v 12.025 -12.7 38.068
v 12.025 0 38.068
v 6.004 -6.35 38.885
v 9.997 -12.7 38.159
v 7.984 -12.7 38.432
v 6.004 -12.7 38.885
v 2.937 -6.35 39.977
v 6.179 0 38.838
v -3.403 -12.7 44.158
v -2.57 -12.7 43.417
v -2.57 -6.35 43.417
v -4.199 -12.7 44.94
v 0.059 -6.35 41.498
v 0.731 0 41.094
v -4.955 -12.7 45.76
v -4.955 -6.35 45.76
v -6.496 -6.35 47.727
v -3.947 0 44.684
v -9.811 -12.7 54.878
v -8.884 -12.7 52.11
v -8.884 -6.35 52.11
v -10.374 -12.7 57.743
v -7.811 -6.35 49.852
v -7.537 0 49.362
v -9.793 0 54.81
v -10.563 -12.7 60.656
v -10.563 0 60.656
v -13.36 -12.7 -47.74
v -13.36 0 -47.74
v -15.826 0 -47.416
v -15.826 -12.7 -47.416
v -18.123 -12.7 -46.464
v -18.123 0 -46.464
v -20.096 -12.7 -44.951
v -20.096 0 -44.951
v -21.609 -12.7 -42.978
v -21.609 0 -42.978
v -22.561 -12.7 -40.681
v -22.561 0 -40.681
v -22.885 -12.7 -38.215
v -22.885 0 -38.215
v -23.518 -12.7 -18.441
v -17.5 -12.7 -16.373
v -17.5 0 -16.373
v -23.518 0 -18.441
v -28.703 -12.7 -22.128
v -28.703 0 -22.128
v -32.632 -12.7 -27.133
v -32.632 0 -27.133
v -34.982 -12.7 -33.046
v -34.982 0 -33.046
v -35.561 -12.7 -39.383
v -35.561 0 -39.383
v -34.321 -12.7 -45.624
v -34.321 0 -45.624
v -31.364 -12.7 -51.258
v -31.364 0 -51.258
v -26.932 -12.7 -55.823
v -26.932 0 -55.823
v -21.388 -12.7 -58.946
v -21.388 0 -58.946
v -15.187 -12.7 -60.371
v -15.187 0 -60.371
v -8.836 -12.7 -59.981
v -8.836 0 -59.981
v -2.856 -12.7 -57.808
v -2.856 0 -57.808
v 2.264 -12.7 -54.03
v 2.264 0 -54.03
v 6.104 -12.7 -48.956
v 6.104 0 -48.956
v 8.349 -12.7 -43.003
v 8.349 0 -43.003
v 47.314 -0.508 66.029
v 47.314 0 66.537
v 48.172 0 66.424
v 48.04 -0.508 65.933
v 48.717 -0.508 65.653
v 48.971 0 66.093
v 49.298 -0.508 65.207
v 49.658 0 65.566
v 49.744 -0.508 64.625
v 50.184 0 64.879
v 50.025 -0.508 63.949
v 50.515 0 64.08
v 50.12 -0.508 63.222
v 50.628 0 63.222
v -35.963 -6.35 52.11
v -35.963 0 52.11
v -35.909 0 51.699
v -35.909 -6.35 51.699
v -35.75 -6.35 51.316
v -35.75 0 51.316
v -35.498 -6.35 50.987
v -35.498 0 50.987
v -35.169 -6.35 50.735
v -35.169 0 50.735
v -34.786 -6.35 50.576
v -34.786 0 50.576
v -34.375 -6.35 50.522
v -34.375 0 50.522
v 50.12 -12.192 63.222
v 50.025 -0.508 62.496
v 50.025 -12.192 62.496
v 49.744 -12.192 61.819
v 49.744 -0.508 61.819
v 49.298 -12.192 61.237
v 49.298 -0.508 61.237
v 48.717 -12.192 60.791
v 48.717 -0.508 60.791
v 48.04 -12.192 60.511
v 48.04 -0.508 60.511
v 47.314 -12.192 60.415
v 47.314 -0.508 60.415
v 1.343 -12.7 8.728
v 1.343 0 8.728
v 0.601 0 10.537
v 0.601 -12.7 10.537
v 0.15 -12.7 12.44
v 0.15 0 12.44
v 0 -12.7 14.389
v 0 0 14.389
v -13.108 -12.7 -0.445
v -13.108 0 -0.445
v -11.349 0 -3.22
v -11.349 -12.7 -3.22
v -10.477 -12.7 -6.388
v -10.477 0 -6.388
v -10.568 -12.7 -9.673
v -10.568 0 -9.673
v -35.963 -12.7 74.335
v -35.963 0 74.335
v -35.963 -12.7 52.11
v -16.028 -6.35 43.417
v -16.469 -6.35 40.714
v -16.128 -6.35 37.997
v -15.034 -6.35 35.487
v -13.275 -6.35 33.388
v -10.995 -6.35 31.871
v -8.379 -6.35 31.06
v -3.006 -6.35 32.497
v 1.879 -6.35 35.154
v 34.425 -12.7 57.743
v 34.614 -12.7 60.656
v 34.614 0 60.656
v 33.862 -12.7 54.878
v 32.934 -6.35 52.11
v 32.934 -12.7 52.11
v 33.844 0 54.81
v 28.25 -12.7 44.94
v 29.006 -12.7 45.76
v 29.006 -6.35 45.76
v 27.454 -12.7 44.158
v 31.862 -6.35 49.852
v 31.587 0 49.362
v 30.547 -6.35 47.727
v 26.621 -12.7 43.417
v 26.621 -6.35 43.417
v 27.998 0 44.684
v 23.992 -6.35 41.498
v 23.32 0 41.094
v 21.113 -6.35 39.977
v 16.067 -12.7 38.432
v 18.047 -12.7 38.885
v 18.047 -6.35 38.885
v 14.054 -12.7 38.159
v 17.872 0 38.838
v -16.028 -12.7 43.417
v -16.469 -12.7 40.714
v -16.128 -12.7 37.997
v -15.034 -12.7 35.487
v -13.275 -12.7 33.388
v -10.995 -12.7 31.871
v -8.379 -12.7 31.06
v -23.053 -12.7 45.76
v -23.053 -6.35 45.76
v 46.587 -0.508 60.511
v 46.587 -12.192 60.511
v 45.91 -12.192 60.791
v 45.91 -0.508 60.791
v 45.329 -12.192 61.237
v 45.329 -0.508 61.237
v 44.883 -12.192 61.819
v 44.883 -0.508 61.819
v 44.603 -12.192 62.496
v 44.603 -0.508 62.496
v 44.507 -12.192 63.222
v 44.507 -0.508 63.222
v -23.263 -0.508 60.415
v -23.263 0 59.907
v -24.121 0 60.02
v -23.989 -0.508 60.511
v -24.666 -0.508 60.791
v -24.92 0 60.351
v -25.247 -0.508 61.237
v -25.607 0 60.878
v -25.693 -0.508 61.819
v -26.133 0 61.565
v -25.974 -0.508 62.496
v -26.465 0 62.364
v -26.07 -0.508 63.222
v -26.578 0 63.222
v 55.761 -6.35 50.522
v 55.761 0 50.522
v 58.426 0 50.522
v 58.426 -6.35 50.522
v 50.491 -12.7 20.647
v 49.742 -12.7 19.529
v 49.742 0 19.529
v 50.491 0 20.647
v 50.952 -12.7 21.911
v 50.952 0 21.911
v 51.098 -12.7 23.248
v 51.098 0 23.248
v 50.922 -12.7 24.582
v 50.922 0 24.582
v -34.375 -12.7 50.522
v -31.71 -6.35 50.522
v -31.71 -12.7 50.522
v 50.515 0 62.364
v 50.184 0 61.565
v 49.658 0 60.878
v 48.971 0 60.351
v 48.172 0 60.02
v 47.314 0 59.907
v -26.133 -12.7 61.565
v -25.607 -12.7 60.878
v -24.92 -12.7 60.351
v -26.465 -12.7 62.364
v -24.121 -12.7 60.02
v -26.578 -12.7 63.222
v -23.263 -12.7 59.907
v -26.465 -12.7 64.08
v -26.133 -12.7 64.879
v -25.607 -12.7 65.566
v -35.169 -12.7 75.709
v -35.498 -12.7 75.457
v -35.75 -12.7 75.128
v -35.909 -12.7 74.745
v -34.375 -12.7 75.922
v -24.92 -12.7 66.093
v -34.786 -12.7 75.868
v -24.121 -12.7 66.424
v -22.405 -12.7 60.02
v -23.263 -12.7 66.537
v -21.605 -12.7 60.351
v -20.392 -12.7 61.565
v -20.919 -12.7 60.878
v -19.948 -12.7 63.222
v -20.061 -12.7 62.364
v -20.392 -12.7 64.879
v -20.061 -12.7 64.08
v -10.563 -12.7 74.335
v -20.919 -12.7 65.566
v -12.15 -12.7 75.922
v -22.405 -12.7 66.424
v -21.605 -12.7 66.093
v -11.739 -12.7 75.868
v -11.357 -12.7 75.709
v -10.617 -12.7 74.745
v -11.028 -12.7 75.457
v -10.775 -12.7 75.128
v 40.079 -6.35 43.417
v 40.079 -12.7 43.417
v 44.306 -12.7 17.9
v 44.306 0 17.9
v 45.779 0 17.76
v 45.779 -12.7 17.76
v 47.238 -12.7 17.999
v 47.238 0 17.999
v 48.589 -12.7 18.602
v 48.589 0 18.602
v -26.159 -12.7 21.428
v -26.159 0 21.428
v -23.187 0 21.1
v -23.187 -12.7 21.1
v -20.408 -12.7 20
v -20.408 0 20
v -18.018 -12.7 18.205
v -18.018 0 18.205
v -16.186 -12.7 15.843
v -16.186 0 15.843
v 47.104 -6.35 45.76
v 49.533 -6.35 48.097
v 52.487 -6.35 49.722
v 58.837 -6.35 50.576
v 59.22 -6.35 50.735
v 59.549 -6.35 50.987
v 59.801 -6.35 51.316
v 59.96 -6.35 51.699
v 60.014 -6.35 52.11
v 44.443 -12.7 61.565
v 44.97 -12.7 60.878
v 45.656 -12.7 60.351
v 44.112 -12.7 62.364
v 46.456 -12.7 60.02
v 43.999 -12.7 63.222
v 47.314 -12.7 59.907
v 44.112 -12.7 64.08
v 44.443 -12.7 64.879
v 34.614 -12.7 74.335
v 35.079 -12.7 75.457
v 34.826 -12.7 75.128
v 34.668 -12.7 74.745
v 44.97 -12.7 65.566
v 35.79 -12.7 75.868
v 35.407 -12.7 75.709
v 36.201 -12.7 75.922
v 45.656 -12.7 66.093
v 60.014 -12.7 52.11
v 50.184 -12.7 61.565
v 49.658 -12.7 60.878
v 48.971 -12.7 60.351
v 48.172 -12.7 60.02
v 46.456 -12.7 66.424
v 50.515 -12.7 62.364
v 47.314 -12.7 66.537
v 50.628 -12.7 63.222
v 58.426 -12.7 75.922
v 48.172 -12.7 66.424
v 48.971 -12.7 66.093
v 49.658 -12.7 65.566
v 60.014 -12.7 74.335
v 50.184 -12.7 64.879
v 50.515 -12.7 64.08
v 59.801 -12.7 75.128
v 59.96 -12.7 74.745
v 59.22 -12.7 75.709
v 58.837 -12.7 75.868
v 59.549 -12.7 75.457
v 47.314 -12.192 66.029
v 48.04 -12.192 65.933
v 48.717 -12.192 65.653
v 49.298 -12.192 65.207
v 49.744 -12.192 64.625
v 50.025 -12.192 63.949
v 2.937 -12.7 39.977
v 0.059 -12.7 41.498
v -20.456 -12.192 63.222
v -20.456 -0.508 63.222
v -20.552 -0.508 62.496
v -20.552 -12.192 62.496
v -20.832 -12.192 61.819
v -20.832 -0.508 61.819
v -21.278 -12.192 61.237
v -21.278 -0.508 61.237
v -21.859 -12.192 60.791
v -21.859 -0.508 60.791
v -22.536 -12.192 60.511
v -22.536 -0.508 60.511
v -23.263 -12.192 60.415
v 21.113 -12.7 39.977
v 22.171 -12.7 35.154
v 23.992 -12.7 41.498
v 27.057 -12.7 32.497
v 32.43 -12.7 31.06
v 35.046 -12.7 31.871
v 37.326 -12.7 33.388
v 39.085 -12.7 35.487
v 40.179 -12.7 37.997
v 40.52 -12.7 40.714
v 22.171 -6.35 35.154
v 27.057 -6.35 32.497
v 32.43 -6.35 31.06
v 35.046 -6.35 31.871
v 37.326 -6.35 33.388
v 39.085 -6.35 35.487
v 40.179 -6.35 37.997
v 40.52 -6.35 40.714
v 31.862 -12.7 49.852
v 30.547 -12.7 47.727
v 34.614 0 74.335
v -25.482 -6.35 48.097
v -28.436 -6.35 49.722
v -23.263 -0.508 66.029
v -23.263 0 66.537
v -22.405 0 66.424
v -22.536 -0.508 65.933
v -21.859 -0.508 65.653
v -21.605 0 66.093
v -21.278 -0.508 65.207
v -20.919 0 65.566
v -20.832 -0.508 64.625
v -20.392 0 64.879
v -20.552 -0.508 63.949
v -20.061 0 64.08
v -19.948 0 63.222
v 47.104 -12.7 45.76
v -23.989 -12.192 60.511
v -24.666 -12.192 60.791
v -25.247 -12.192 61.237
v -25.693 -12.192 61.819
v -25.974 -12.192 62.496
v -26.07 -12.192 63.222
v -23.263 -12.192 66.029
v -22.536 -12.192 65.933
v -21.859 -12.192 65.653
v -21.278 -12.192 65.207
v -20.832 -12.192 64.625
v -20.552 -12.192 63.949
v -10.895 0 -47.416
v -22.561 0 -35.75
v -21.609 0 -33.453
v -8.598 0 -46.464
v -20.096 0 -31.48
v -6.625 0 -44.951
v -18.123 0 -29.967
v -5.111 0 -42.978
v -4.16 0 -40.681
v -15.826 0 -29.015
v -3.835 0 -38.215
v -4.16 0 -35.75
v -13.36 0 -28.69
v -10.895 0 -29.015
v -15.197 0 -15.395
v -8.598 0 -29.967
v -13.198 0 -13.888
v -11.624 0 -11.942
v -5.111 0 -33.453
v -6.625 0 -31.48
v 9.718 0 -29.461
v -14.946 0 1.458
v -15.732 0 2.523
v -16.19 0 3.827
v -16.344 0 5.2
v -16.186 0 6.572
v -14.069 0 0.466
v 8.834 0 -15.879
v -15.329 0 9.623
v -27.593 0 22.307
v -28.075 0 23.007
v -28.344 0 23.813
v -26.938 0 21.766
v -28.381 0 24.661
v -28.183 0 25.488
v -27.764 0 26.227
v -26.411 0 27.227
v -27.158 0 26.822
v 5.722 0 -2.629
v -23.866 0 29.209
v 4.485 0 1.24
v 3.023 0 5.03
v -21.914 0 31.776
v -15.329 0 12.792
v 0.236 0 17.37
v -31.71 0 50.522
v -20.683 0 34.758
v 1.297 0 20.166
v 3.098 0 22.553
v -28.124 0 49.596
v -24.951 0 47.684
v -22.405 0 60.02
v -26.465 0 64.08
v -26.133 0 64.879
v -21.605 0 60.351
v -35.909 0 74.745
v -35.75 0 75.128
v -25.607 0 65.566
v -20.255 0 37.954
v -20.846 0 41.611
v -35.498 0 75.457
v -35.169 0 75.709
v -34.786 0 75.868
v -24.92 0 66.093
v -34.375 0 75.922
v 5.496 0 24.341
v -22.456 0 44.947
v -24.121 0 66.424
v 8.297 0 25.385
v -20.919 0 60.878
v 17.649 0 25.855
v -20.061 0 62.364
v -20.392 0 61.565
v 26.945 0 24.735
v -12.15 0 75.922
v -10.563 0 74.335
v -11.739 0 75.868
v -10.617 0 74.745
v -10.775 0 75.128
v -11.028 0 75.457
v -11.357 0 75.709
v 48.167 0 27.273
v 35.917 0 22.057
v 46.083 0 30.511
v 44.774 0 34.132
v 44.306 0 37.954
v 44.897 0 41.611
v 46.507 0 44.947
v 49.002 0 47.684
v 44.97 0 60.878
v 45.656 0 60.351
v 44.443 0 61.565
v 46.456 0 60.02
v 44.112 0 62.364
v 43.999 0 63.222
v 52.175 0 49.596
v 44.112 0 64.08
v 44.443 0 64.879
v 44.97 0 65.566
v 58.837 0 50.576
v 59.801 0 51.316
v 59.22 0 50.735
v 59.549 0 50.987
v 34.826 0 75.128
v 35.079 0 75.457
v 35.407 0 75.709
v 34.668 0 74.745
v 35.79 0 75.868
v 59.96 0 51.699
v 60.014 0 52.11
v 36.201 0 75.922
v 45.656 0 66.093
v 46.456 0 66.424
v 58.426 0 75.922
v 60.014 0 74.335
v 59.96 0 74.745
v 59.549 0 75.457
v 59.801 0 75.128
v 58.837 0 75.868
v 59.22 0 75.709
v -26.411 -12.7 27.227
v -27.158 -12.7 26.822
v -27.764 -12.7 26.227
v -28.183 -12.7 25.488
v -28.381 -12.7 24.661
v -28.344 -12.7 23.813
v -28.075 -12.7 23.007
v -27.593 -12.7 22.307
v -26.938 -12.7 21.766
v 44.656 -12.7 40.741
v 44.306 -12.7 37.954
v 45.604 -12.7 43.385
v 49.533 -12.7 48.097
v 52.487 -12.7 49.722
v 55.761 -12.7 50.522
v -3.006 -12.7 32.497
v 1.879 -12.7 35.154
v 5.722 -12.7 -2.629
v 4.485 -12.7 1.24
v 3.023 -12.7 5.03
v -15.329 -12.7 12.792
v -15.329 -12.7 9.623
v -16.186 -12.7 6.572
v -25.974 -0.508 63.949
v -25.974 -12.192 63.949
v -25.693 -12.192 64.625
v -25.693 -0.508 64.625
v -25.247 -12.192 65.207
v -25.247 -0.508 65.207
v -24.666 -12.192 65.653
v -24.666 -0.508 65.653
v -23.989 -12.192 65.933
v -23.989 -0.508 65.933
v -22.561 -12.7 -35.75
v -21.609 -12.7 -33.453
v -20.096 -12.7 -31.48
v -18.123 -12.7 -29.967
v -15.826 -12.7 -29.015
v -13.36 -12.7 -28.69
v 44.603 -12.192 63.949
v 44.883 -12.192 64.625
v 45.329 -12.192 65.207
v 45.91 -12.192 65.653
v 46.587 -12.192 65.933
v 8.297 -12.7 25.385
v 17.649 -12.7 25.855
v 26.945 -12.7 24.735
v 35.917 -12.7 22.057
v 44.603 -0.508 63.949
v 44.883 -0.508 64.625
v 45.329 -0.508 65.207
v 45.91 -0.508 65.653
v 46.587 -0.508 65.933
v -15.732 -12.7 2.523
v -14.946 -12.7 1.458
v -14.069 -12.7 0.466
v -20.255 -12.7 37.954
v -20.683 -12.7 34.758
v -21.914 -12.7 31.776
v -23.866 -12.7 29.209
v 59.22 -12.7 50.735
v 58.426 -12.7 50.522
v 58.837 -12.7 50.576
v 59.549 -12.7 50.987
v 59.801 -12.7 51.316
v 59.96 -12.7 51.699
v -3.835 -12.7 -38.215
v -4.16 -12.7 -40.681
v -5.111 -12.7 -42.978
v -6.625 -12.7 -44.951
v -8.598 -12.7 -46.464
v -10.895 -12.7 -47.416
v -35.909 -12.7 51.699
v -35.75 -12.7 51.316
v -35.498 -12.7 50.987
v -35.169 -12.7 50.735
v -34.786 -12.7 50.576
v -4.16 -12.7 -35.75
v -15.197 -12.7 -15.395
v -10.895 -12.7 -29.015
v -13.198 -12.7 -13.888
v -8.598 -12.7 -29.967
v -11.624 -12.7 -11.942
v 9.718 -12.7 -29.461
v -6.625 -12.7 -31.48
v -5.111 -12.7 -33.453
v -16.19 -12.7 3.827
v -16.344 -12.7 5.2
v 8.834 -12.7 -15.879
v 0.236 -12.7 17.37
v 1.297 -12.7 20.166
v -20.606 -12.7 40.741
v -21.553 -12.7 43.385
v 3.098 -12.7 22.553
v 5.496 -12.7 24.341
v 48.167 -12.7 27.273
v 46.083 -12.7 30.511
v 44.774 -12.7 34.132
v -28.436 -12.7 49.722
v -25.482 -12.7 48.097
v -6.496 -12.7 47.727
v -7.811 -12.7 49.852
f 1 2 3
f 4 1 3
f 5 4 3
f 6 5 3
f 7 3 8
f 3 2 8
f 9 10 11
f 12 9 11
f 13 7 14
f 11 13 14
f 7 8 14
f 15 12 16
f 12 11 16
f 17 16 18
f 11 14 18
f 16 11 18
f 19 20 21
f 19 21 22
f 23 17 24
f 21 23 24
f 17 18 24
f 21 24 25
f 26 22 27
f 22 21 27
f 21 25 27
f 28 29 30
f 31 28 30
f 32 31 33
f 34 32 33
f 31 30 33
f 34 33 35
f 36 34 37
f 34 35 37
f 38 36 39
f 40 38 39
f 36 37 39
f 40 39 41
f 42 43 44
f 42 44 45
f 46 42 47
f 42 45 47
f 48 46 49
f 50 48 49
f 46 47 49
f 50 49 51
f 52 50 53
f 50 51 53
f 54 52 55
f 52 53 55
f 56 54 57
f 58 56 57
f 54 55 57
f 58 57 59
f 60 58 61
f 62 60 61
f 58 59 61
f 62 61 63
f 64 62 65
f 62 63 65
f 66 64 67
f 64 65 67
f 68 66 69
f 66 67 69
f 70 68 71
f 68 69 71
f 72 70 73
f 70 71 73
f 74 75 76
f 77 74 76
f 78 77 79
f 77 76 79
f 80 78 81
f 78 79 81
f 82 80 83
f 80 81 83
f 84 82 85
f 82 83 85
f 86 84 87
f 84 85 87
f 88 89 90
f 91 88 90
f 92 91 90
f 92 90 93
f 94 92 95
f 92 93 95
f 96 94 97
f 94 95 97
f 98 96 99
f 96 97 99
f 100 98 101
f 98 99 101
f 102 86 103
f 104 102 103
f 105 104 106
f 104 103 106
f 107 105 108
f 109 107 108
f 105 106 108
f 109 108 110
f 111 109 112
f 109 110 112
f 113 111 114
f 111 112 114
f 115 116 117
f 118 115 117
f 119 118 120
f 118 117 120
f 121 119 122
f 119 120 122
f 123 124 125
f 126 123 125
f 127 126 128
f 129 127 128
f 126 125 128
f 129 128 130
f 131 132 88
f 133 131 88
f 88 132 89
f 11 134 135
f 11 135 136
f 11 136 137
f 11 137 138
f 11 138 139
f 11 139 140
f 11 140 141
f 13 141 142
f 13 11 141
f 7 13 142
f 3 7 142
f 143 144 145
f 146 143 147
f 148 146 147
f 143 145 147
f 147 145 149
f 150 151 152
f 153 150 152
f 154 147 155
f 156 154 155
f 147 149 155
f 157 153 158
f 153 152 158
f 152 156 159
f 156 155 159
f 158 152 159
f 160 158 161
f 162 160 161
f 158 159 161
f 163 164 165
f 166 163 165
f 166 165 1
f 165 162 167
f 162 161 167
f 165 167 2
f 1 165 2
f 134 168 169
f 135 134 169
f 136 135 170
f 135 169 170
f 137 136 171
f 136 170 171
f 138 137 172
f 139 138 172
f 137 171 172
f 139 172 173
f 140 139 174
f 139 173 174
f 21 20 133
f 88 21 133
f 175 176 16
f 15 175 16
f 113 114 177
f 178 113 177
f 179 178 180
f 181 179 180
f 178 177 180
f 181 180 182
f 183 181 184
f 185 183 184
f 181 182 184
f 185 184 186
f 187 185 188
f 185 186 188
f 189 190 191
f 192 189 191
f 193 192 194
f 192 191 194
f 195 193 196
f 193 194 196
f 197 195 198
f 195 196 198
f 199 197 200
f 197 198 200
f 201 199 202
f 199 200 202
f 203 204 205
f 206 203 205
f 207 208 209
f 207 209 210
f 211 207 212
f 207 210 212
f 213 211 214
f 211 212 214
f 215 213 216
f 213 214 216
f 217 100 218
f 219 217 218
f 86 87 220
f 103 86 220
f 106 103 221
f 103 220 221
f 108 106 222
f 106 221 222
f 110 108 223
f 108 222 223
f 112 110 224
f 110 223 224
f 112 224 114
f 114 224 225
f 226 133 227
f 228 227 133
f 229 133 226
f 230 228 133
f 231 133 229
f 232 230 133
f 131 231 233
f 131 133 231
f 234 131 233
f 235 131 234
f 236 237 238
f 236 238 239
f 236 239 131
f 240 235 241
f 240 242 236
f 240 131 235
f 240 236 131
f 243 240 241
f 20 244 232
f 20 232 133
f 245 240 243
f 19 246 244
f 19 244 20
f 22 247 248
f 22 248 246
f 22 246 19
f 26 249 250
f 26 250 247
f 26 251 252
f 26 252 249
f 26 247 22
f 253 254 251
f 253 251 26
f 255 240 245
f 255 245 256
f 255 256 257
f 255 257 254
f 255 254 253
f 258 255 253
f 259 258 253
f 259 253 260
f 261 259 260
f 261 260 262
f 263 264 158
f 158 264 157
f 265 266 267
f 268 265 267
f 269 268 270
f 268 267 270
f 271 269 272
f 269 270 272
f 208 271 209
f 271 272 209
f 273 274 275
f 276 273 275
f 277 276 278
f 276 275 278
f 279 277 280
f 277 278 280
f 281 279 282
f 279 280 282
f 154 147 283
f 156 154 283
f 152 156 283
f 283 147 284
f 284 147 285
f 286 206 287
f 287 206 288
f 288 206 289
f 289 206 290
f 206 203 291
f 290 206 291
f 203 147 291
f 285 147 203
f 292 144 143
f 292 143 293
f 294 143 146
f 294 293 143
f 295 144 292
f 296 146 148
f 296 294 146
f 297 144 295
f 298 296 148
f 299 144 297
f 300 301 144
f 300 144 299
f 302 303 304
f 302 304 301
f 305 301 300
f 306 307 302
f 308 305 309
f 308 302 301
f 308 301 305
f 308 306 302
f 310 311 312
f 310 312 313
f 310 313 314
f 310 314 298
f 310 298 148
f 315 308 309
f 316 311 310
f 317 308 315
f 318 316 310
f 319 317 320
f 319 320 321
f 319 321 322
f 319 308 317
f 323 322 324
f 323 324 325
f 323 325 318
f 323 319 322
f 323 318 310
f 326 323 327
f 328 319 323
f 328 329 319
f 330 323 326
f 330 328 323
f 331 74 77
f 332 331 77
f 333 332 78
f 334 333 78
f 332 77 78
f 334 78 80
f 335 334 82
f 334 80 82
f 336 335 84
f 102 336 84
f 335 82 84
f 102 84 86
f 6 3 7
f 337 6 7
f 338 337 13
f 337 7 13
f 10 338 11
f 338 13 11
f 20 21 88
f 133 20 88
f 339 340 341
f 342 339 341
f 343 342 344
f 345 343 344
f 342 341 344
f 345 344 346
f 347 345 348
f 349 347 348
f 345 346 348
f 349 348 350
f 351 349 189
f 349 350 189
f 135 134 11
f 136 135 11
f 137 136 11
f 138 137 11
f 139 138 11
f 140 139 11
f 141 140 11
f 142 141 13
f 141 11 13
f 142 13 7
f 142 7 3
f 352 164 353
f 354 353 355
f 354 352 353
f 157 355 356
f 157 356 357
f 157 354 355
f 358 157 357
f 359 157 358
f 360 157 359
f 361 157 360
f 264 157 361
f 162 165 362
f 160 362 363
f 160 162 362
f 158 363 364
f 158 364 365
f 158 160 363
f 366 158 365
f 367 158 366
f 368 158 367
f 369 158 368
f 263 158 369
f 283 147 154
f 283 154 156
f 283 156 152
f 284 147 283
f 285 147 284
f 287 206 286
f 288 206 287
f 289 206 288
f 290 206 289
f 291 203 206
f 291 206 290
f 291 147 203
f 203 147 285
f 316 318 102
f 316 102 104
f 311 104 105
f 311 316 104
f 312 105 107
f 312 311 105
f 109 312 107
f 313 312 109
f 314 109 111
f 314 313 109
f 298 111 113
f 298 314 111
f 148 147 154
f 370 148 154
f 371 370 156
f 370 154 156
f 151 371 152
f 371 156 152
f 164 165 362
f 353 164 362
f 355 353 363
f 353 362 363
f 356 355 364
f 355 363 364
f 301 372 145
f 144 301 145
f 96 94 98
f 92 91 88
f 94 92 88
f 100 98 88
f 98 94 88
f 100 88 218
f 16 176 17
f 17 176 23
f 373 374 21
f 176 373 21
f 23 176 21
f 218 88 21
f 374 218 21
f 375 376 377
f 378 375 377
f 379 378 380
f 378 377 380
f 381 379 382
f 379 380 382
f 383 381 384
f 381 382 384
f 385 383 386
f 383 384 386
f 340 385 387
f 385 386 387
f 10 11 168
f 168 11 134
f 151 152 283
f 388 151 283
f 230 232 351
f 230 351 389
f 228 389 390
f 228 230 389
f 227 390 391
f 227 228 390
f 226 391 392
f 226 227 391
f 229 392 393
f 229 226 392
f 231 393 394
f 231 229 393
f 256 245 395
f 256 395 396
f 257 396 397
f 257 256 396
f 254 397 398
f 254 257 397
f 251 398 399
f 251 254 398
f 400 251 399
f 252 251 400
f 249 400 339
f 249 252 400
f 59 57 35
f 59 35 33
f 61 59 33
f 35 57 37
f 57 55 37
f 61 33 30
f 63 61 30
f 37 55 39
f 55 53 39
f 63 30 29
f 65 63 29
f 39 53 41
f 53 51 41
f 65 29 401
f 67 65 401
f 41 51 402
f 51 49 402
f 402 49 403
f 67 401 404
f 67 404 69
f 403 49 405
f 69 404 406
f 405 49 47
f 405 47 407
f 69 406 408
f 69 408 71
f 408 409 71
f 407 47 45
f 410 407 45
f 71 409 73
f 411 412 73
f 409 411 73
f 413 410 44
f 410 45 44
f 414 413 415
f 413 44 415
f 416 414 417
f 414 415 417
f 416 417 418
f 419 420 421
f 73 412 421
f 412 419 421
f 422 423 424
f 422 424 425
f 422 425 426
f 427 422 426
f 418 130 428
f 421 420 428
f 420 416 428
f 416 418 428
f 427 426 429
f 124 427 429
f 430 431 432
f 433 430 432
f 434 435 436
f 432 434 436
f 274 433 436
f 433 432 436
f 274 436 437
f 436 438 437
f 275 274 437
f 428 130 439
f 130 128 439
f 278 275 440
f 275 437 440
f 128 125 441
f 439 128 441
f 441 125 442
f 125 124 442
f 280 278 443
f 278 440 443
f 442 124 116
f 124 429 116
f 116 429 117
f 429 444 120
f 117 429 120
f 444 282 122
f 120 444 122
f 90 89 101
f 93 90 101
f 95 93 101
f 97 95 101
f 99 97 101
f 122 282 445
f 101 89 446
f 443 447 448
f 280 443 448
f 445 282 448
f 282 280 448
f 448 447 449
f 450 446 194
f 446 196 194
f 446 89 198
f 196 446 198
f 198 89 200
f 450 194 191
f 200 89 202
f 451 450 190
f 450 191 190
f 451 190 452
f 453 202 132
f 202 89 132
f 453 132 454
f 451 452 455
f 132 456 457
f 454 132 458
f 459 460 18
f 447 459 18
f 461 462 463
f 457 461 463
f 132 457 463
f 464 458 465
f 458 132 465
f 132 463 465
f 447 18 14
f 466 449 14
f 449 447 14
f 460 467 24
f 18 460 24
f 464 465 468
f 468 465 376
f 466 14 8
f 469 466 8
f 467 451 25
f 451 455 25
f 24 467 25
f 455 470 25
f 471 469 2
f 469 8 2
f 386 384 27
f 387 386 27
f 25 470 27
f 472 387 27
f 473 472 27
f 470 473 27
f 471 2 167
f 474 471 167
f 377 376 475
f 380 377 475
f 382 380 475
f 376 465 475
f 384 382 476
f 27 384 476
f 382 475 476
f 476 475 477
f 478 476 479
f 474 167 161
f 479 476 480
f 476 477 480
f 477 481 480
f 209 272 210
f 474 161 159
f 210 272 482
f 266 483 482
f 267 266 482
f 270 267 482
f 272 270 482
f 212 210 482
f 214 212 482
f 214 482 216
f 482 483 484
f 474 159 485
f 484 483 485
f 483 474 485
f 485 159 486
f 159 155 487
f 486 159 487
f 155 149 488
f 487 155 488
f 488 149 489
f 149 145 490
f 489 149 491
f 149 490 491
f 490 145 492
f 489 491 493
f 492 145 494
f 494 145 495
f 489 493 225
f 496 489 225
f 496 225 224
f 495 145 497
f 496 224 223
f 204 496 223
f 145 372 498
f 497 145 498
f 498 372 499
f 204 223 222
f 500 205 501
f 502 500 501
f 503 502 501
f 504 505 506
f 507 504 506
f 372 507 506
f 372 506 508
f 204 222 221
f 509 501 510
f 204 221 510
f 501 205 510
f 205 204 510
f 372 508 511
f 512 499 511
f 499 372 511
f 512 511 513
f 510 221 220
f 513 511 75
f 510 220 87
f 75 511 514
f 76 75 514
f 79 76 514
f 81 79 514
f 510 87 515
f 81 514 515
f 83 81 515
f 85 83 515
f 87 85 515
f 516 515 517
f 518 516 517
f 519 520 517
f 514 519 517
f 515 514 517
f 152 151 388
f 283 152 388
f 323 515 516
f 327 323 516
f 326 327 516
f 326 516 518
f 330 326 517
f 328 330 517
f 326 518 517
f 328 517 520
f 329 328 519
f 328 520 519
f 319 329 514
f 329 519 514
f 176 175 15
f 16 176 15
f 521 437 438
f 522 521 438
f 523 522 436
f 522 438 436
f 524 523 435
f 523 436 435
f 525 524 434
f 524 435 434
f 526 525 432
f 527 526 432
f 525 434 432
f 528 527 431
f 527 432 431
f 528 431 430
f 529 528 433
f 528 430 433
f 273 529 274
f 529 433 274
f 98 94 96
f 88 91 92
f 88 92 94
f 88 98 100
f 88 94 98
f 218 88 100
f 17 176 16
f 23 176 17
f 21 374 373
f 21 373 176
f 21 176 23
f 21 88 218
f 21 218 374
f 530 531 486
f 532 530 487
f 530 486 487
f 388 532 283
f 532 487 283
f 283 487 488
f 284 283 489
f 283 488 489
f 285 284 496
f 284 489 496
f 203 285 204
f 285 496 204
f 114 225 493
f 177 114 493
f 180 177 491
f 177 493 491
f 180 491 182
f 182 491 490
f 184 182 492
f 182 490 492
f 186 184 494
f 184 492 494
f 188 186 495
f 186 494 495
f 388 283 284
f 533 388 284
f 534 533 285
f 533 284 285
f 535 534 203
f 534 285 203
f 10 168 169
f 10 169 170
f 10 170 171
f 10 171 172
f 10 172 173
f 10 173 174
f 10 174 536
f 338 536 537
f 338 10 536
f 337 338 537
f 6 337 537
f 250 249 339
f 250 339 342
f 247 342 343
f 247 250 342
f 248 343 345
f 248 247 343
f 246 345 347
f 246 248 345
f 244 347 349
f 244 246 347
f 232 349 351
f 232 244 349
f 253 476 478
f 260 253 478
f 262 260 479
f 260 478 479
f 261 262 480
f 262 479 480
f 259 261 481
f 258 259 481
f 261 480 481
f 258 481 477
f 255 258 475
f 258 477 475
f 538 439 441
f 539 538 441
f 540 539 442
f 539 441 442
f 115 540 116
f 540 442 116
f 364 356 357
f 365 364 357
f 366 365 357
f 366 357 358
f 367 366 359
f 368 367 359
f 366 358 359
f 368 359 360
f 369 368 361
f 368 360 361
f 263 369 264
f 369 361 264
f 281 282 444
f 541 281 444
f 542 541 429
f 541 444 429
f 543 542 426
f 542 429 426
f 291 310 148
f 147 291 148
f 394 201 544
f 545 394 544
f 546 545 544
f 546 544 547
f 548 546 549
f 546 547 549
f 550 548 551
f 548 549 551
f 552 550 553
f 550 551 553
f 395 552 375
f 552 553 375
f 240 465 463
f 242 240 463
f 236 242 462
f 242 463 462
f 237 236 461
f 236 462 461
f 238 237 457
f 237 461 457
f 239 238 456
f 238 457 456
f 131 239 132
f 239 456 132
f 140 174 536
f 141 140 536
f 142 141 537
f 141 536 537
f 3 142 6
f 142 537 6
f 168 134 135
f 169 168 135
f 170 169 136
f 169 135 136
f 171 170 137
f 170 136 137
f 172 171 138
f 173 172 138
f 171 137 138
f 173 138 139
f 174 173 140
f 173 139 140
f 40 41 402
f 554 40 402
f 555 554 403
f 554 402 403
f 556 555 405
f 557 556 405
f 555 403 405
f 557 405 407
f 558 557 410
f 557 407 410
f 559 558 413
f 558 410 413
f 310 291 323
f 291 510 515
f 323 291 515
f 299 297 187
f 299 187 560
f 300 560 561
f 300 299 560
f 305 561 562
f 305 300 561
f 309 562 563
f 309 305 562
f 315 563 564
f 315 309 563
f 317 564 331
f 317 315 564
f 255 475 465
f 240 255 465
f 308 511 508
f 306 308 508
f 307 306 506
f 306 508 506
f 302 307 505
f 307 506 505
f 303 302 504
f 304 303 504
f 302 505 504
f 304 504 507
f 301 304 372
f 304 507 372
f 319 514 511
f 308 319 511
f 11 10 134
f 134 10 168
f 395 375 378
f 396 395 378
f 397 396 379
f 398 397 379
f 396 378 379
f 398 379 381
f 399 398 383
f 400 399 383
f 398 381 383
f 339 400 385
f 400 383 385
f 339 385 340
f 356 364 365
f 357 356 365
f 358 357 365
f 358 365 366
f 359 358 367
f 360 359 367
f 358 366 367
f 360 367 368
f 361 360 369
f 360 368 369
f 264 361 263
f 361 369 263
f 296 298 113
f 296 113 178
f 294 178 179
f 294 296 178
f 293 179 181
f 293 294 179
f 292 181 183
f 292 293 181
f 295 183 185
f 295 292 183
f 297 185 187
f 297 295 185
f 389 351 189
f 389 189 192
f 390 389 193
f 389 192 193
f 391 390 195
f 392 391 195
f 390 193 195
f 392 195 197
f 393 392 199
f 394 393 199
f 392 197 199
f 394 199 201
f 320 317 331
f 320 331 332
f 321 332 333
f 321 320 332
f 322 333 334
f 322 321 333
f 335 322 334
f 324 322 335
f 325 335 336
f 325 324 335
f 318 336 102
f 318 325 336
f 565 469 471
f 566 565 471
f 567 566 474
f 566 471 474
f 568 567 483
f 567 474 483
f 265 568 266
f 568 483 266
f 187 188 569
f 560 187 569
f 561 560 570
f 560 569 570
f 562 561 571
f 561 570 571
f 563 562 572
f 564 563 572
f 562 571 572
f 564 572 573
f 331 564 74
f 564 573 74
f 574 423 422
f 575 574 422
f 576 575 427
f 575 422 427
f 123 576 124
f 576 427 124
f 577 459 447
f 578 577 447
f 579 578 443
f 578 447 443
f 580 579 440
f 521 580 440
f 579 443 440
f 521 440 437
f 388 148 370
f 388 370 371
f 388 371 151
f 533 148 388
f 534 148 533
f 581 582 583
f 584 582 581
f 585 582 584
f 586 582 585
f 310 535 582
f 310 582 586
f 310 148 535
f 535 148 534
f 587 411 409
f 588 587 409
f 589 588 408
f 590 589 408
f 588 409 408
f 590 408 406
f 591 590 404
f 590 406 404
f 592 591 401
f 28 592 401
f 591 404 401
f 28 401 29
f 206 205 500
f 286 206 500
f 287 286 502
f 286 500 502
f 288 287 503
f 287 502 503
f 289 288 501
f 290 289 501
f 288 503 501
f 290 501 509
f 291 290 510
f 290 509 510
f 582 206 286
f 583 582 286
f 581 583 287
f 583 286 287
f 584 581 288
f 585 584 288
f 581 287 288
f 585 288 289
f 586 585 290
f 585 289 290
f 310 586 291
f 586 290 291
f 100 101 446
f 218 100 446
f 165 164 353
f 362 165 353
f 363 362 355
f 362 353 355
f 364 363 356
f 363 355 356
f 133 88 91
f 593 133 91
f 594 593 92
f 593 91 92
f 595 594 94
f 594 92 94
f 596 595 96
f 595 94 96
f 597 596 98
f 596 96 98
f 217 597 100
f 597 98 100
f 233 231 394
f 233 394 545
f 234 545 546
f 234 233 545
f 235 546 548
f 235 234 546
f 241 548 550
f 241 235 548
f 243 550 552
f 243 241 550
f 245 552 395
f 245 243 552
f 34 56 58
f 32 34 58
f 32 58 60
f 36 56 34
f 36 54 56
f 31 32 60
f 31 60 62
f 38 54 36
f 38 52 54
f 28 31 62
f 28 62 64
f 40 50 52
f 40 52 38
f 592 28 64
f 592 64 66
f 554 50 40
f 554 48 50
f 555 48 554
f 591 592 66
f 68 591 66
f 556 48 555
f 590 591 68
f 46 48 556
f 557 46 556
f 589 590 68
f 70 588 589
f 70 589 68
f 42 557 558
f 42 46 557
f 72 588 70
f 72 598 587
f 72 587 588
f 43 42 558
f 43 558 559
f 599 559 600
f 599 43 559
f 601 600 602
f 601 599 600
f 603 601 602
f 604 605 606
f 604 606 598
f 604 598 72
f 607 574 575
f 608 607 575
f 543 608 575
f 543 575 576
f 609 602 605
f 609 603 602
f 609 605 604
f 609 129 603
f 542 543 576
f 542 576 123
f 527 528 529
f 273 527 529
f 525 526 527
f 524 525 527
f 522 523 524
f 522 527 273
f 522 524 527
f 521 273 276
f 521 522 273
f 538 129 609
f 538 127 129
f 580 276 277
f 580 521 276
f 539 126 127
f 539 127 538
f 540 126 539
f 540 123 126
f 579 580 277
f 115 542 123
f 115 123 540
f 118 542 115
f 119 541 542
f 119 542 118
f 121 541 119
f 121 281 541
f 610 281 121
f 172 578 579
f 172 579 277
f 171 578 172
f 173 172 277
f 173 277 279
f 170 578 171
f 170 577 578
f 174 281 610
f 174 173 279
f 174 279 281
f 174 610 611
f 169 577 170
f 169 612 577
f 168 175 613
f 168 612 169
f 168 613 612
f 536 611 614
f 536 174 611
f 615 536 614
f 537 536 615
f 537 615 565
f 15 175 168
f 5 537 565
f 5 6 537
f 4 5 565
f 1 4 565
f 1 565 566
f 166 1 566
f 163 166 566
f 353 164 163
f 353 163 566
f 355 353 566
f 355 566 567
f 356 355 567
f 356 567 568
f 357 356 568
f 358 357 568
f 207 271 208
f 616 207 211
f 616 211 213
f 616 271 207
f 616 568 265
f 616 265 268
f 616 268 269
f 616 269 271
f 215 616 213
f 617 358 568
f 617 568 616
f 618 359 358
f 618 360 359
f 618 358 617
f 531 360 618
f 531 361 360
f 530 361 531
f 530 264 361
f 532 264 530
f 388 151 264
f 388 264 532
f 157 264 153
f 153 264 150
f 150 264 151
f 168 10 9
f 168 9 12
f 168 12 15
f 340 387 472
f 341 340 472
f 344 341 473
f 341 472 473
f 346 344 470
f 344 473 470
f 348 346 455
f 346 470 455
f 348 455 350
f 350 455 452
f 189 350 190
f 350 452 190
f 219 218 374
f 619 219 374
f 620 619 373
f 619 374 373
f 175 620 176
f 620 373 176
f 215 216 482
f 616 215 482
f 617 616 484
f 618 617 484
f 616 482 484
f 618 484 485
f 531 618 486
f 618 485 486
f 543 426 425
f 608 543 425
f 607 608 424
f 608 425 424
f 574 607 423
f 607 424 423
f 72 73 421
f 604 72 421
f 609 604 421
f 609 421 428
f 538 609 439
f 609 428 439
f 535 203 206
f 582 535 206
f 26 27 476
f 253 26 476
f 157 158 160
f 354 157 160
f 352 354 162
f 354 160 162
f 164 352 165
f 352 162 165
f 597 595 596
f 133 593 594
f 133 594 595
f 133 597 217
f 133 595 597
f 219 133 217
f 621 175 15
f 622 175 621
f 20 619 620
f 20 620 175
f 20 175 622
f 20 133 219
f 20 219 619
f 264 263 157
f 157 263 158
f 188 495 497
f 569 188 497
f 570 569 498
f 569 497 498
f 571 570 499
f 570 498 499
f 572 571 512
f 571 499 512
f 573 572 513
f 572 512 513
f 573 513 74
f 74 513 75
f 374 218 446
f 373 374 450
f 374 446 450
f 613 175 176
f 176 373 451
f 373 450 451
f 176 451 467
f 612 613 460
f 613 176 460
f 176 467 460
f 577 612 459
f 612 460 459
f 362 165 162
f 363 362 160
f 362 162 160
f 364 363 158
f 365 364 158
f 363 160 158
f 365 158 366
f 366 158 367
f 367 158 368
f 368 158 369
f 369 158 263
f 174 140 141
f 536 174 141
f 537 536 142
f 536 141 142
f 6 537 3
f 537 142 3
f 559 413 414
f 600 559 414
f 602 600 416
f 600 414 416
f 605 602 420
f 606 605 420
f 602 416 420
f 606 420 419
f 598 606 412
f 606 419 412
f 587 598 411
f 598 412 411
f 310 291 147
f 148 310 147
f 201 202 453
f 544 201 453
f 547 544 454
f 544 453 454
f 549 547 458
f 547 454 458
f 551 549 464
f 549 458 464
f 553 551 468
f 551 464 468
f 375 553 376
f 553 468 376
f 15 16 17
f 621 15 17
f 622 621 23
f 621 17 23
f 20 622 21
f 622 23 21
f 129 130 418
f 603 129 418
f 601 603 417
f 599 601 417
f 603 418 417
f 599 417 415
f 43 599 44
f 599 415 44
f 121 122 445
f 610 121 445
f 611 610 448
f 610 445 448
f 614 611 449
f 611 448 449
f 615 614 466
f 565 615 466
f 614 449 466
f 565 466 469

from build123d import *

# Parameters (mm, degrees)
F1_DEPTH = 12.7
F2_SIZE  = 0.508
F4_DEPTH = 6.35
F5_DEPTH = 6.35


with BuildPart() as f1:
    # F0 (on Front) → F1 (new body)
    with BuildSketch(Plane.XZ):
        with BuildLine():
            Line((-35.9628051519, 74.3345879376), (-35.9628051519, 52.1095879376))
            ThreePointArc((-35.9628051519, 52.1095879376), (-35.4978371671, 50.9870559225), (-34.3753051519, 50.5220879376))
            Line((-34.3753051519, 50.5220879376), (-31.7102633417, 50.5220879376))
            ThreePointArc((-31.7102633417, 50.5220879376), (-23.6045079295, 46.4058672096), (-20.2551409602, 37.9543416202))
            ThreePointArc((-20.2551409602, 37.9543416202), (-21.9138635475, 31.7764261625), (-26.4106839895, 27.2270739079))
            ThreePointArc((-26.4106839895, 27.2270739079), (-28.3924598426, 24.2357162237), (-26.1585302651, 21.4276537299))
            ThreePointArc((-26.1585302651, 21.4276537299), (-20.4079287218, 20.0003341812), (-16.1861311644, 15.8430412412))
            ThreePointArc((-16.1861311644, 15.8430412412), (-15.2200232553, 11.207539821), (-16.1861311644, 6.5720384009))
            ThreePointArc((-16.1861311644, 6.5720384009), (-16.3062460987, 4.5087014073), (-15.732049942, 2.5232327171))
            ThreePointArc((-15.732049942, 2.5232327171), (-14.5189102199, 0.951875362), (-13.1080421386, -0.4446643545))
            ThreePointArc((-13.1080421386, -0.4446643545), (-10.795687591, -4.7716751996), (-10.5683878064, -9.6725262702))
            ThreePointArc((-10.5683878064, -9.6725262702), (-13.1984563019, -13.8877028461), (-17.5003244607, -16.3734430181))
            ThreePointArc((-17.5003244607, -16.3734430181), (-29.3118646244, -53.699793422), (8.3489892293, -43.002644151))
            ThreePointArc((8.3489892293, -43.002644151), (9.557638386, -22.651764197), (5.7222023606, -2.6290626265))
            ThreePointArc((5.7222023606, -2.6290626265), (3.7814770492, 3.1455305799), (1.3426912483, 8.728062734))
            ThreePointArc((1.3426912483, 8.728062734), (0.3379920997, 11.4796705796), (0, 14.3894003704))
            ThreePointArc((0, 14.3894003704), (2.1128447305, 21.423665691), (8.2974387333, 25.3854580224))
            ThreePointArc((8.2974387333, 25.3854580224), (26.9445854097, 24.7346775815), (44.3060602993, 17.899563536))
            ThreePointArc((44.3060602993, 17.899563536), (47.2383051728, 17.9992305099), (49.741897732, 19.5289421827))
            ThreePointArc((49.741897732, 19.5289421827), (50.952066256, 21.9105950176), (50.9217604995, 24.5818980038))
            ThreePointArc((50.9217604995, 24.5818980038), (46.0830273259, 30.5107516192), (44.3060602993, 37.9543416202))
            ThreePointArc((44.3060602993, 37.9543416202), (47.6554272686, 46.4058672096), (55.7611826807, 50.5220879376))
            Line((55.7611826807, 50.5220879376), (58.426224491, 50.5220879376))
            ThreePointArc((58.426224491, 50.5220879376), (59.5487565061, 50.9870559225), (60.013724491, 52.1095879376))
            Line((60.013724491, 52.1095879376), (60.013724491, 74.3345879376))
            ThreePointArc((60.013724491, 74.3345879376), (59.5487565061, 75.4571199527), (58.426224491, 75.9220879376))
            Line((58.426224491, 75.9220879376), (36.201224491, 75.9220879376))
            ThreePointArc((36.201224491, 75.9220879376), (35.0786924759, 75.4571199527), (34.613724491, 74.3345879376))
            Line((34.613724491, 74.3345879376), (34.613724491, 60.6561478734))
            ThreePointArc((34.613724491, 60.6561478734), (27.9977749, 44.6838326429), (12.0254596695, 38.0678830519))
            ThreePointArc((12.0254596695, 38.0678830519), (-3.946855561, 44.6838326429), (-10.5628051519, 60.6561478734))
            Line((-10.5628051519, 60.6561478734), (-10.5628051519, 74.3345879376))
            ThreePointArc((-10.5628051519, 74.3345879376), (-11.0277731368, 75.4571199527), (-12.1503051519, 75.9220879376))
            Line((-12.1503051519, 75.9220879376), (-34.3753051519, 75.9220879376))
            ThreePointArc((-34.3753051519, 75.9220879376), (-35.4978371671, 75.4571199527), (-35.9628051519, 74.3345879376))
        make_face()
        with BuildLine():
            ThreePointArc((-13.3603820577, -28.6904807448), (-6.6251899669, -31.480288654), (-3.8353820577, -38.2154807448))
            ThreePointArc((-3.8353820577, -38.2154807448), (-6.6251899669, -44.9506728356), (-13.3603820577, -47.7404807448))
            ThreePointArc((-13.3603820577, -47.7404807448), (-20.0955741485, -44.9506728356), (-22.8853820577, -38.2154807448))
            ThreePointArc((-22.8853820577, -38.2154807448), (-20.0955741485, -31.480288654), (-13.3603820577, -28.6904807448))
        make_face(mode=Mode.SUBTRACT)
        with BuildLine():
            ThreePointArc((-20.4561051519, 63.2220879376), (-21.2781685492, 61.2374513348), (-23.2628051519, 60.4153879376))
            ThreePointArc((-23.2628051519, 60.4153879376), (-25.2474417547, 61.2374513348), (-26.0695051519, 63.2220879376))
            ThreePointArc((-26.0695051519, 63.2220879376), (-25.2474417547, 65.2067245403), (-23.2628051519, 66.0287879376))
            ThreePointArc((-23.2628051519, 66.0287879376), (-21.2781685492, 65.2067245403), (-20.4561051519, 63.2220879376))
        make_face(mode=Mode.SUBTRACT)
        with BuildLine():
            ThreePointArc((47.313724491, 66.0287879376), (49.2983610938, 65.2067245403), (50.120424491, 63.2220879376))
            ThreePointArc((50.120424491, 63.2220879376), (49.2983610938, 61.2374513348), (47.313724491, 60.4153879376))
            ThreePointArc((47.313724491, 60.4153879376), (45.3290878882, 61.2374513348), (44.507024491, 63.2220879376))
            ThreePointArc((44.507024491, 63.2220879376), (45.3290878882, 65.2067245403), (47.313724491, 66.0287879376))
        make_face(mode=Mode.SUBTRACT)
    extrude(amount=F1_DEPTH)

    # F2
    f2_edges = [f1.edges().sort_by_distance(p)[0] for p in [
        (-23.262805, -12.7, 60.415388),
        (47.313724, -12.7, 66.028788),
        (47.313724, 0, 66.028788),
        (-23.262805, 0, 60.415388),
    ]]
    chamfer(f2_edges, length=F2_SIZE)

    # F3 (on face) → F4 (cut)
    with BuildSketch(Plane.XZ.offset(12.7)):
        with BuildLine():
            Line((-8.8835341109, 52.1095879376), (-35.9628051519, 52.1095879376))
            ThreePointArc((-35.9628051519, 52.1095879376), (-35.4978371671, 50.9870559225), (-34.3753051519, 50.5220879376))
            Line((-34.3753051519, 50.5220879376), (-31.7102633417, 50.5220879376))
            ThreePointArc((-31.7102633417, 50.5220879376), (-26.9055008974, 49.0067085852), (-23.0534458939, 45.75958848))
            Line((-23.0534458939, 45.75958848), (-4.9545940961, 45.75958848))
            ThreePointArc((-4.9545940961, 45.75958848), (-7.1832780366, 48.7711109201), (-8.8835341109, 52.1095879376))
        make_face()
        with BuildLine():
            Line((60.013724491, 52.1095879376), (32.9344534499, 52.1095879376))
            ThreePointArc((32.9344534499, 52.1095879376), (31.2341973757, 48.7711109201), (29.0055134352, 45.75958848))
            Line((29.0055134352, 45.75958848), (47.104365233, 45.75958848))
            ThreePointArc((47.104365233, 45.75958848), (50.9564202365, 49.0067085852), (55.7611826807, 50.5220879376))
            Line((55.7611826807, 50.5220879376), (58.426224491, 50.5220879376))
            ThreePointArc((58.426224491, 50.5220879376), (59.5487565061, 50.9870559225), (60.013724491, 52.1095879376))
        make_face()
        with BuildLine():
            Line((40.0793049484, 43.4168316424), (26.6212016353, 43.4168316424))
            ThreePointArc((26.6212016353, 43.4168316424), (22.5799758765, 40.6853718424), (18.0465854352, 38.8851636936))
            ThreePointArc((18.0465854352, 38.8851636936), (24.5354070051, 33.6806648499), (32.4300676584, 31.0603696853))
            ThreePointArc((32.4300676584, 31.0603696853), (39.084946833, 35.4865348655), (40.0793049484, 43.4168316424))
        make_face()
        with BuildLine():
            ThreePointArc((6.0043339039, 38.8851636936), (1.4709434626, 40.6853718424), (-2.5702822963, 43.4168316424))
            Line((-2.5702822963, 43.4168316424), (-16.0283856094, 43.4168316424))
            ThreePointArc((-16.0283856094, 43.4168316424), (-15.0340274939, 35.4865348655), (-8.3791483194, 31.0603696853))
            ThreePointArc((-8.3791483194, 31.0603696853), (-0.4844876661, 33.6806648499), (6.0043339039, 38.8851636936))
        make_face()
    extrude(amount=-F4_DEPTH, mode=Mode.SUBTRACT)


with BuildPart() as f5:
    # F5 (new): a face of the model
    f5_faces = [f1.part.faces().sort_by_distance(p)[0] for p in [
        (-18.2506791882, -6.35, 49.2131238692),
    ]]
    extrude(f5_faces, amount=F5_DEPTH)


with BuildPart() as f5b:
    # F5#2 (new): a face of the model
    f5_2_faces = [f1.part.faces().sort_by_distance(p)[0] for p in [
        (42.3015985272, -6.35, 49.2131238692),
    ]]
    extrude(f5_2_faces, amount=F5_DEPTH)


with BuildPart() as f5c:
    # F5#3 (new): a face of the model
    f5_3_faces = [f1.part.faces().sort_by_distance(p)[0] for p in [
        (-6.7748141706, -6.35, 37.8823444138),
    ]]
    extrude(f5_3_faces, amount=F5_DEPTH)


with BuildPart() as f5d:
    # F5#4 (new): a face of the model
    f5_4_faces = [f1.part.faces().sort_by_distance(p)[0] for p in [
        (30.8257335097, -6.35, 37.8823444138),
    ]]
    extrude(f5_4_faces, amount=F5_DEPTH)


solid = Compound([f1.part, f5.part, f5b.part, f5c.part, f5d.part])
